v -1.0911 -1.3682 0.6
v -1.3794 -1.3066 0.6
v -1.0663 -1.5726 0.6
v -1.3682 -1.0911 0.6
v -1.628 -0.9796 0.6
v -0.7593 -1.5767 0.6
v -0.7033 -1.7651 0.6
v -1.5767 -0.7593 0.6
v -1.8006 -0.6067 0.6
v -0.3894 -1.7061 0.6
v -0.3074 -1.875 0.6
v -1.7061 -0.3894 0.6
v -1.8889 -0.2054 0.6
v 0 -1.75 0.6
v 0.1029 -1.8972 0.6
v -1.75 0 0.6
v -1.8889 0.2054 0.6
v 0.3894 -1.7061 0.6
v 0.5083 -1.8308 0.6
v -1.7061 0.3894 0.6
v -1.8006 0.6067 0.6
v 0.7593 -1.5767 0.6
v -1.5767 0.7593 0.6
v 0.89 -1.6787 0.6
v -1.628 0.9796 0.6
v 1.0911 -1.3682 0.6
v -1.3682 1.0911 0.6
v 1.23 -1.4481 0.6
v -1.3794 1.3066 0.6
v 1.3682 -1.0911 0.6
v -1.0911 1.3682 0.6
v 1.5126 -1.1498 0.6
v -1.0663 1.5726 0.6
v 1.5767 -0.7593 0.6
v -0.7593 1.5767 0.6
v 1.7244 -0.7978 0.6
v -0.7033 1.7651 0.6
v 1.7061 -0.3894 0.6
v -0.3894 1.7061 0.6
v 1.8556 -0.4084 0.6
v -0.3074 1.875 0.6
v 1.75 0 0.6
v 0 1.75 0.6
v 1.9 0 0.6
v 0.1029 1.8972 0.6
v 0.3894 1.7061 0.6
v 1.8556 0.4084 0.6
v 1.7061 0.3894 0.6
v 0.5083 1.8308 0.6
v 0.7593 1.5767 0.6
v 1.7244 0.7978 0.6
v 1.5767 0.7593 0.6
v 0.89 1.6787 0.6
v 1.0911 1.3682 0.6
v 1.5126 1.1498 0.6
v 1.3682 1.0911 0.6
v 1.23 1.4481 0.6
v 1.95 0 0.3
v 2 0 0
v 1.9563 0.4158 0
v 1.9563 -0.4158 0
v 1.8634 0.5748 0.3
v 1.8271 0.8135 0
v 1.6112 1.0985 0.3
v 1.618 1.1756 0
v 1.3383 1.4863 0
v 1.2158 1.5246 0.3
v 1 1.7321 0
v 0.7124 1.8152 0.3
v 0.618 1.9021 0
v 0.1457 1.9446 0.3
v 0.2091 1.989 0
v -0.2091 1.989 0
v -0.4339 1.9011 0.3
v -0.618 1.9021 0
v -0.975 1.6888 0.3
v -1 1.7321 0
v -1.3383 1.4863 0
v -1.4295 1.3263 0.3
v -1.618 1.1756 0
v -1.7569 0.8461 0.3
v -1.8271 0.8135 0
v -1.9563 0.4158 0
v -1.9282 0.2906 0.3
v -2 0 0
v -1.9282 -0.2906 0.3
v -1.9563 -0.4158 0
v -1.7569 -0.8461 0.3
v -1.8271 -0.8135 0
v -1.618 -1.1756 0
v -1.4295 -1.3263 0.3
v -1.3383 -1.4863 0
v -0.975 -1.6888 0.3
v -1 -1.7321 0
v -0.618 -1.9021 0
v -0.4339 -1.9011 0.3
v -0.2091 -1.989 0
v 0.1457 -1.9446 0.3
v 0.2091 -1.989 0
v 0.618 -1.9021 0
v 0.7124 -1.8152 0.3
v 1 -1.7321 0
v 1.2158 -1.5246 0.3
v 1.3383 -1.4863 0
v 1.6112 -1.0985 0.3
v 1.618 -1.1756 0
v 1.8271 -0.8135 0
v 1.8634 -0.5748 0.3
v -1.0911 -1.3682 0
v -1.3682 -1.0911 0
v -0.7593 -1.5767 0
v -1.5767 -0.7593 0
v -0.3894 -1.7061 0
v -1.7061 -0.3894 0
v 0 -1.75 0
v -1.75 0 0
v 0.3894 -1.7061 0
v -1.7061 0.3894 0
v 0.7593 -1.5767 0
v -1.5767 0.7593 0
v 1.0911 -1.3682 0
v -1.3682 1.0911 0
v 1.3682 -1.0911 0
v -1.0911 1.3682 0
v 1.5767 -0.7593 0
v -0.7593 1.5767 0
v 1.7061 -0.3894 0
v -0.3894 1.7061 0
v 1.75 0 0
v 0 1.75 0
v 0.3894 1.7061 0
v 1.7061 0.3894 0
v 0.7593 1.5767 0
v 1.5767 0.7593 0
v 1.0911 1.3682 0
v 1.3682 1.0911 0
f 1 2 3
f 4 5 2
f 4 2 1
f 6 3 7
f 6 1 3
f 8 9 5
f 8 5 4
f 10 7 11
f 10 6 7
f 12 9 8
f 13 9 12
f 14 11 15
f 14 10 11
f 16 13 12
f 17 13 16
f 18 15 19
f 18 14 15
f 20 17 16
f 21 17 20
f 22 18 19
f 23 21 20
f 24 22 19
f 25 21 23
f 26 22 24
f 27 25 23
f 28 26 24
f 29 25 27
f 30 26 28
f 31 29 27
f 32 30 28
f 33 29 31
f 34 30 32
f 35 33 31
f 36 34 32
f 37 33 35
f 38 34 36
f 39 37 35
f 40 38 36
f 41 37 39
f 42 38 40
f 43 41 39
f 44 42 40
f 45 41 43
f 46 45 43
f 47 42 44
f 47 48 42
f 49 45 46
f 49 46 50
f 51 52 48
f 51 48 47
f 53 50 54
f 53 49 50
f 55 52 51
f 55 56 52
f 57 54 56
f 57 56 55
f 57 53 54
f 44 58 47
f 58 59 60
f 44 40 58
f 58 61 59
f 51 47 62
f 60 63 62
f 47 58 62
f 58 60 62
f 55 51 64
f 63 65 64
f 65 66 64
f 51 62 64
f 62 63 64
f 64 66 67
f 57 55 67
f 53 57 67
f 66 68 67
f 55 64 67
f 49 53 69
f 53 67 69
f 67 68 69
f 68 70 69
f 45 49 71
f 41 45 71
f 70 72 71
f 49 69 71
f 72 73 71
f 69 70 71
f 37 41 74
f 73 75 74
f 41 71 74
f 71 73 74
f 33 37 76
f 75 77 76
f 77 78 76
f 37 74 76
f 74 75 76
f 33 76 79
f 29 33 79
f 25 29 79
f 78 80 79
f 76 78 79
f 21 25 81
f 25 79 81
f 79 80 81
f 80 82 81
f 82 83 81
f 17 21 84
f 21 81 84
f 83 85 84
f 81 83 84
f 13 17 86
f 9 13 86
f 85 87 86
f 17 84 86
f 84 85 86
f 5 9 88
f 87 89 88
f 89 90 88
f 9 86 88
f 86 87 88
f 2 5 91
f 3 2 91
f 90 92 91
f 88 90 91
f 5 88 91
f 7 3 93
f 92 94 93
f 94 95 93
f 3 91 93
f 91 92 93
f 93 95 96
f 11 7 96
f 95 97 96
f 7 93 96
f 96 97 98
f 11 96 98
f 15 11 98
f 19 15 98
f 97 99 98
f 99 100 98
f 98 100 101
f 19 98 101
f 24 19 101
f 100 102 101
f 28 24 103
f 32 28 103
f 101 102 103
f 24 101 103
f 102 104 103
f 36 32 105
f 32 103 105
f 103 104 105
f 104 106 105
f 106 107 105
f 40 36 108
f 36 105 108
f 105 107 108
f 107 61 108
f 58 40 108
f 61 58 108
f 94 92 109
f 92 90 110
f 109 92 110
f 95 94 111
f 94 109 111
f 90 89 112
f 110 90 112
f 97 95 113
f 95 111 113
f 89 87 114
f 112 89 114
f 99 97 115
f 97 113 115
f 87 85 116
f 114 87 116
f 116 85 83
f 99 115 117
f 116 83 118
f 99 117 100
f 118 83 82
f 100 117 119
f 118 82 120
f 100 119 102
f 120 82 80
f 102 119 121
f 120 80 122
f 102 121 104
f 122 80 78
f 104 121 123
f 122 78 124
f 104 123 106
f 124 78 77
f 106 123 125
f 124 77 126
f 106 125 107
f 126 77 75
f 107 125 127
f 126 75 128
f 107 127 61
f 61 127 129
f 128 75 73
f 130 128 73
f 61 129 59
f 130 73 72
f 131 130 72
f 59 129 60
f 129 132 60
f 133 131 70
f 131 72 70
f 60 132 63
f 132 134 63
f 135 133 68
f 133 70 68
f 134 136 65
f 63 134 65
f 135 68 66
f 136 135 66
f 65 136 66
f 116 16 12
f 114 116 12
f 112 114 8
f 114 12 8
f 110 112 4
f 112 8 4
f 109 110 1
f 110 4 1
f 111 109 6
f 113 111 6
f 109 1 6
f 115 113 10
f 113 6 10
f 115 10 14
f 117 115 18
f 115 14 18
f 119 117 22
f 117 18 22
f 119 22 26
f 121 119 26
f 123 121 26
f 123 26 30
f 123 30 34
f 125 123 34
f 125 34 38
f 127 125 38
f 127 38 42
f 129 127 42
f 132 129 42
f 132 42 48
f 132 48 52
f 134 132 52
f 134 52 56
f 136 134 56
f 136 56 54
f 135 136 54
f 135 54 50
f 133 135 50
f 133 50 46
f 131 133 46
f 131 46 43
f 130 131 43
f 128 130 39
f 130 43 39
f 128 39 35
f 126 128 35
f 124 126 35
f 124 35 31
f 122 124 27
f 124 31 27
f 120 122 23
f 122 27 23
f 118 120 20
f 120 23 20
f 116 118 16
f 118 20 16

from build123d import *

# Parameters (mm, degrees)
F0_R     = 2
F1_DEPTH = 0.6
F2_D     = 3.5
F3_SIZE2 = 0.59999
F3_SIZE  = 0.09999


# Not quite as in the source:
# - a fillet or chamfer is up to 0.001 mm smaller than in the source, because OpenCascade refuses the exact size


with BuildPart() as f1:
    # F0 (on Top) → F1 (new body)
    with BuildSketch(Plane.XY):
        Circle(F0_R)
    extrude(amount=F1_DEPTH)

    # F2 (through all)
    with Locations(Plane(origin=(0, 0, 0), x_dir=(1, 0, 0), z_dir=(0, 0, -1))):
        with Locations((0, 0)):
            Hole(F2_D / 2)

    # F3 (size 0.1 and 0.6 in the source; OpenCascade refuses exactly that, so slightly less here)
    f3_edges = [f1.edges().sort_by_distance(p)[0] for p in [
        (-2, 0, 0.6),
    ]]
    f3_side = f1.faces().sort_by_distance((-1.943431, 0, 0.6))[0]
    chamfer(f3_edges, length=F3_SIZE, length2=F3_SIZE2, reference=f3_side)


solid = f1.part
